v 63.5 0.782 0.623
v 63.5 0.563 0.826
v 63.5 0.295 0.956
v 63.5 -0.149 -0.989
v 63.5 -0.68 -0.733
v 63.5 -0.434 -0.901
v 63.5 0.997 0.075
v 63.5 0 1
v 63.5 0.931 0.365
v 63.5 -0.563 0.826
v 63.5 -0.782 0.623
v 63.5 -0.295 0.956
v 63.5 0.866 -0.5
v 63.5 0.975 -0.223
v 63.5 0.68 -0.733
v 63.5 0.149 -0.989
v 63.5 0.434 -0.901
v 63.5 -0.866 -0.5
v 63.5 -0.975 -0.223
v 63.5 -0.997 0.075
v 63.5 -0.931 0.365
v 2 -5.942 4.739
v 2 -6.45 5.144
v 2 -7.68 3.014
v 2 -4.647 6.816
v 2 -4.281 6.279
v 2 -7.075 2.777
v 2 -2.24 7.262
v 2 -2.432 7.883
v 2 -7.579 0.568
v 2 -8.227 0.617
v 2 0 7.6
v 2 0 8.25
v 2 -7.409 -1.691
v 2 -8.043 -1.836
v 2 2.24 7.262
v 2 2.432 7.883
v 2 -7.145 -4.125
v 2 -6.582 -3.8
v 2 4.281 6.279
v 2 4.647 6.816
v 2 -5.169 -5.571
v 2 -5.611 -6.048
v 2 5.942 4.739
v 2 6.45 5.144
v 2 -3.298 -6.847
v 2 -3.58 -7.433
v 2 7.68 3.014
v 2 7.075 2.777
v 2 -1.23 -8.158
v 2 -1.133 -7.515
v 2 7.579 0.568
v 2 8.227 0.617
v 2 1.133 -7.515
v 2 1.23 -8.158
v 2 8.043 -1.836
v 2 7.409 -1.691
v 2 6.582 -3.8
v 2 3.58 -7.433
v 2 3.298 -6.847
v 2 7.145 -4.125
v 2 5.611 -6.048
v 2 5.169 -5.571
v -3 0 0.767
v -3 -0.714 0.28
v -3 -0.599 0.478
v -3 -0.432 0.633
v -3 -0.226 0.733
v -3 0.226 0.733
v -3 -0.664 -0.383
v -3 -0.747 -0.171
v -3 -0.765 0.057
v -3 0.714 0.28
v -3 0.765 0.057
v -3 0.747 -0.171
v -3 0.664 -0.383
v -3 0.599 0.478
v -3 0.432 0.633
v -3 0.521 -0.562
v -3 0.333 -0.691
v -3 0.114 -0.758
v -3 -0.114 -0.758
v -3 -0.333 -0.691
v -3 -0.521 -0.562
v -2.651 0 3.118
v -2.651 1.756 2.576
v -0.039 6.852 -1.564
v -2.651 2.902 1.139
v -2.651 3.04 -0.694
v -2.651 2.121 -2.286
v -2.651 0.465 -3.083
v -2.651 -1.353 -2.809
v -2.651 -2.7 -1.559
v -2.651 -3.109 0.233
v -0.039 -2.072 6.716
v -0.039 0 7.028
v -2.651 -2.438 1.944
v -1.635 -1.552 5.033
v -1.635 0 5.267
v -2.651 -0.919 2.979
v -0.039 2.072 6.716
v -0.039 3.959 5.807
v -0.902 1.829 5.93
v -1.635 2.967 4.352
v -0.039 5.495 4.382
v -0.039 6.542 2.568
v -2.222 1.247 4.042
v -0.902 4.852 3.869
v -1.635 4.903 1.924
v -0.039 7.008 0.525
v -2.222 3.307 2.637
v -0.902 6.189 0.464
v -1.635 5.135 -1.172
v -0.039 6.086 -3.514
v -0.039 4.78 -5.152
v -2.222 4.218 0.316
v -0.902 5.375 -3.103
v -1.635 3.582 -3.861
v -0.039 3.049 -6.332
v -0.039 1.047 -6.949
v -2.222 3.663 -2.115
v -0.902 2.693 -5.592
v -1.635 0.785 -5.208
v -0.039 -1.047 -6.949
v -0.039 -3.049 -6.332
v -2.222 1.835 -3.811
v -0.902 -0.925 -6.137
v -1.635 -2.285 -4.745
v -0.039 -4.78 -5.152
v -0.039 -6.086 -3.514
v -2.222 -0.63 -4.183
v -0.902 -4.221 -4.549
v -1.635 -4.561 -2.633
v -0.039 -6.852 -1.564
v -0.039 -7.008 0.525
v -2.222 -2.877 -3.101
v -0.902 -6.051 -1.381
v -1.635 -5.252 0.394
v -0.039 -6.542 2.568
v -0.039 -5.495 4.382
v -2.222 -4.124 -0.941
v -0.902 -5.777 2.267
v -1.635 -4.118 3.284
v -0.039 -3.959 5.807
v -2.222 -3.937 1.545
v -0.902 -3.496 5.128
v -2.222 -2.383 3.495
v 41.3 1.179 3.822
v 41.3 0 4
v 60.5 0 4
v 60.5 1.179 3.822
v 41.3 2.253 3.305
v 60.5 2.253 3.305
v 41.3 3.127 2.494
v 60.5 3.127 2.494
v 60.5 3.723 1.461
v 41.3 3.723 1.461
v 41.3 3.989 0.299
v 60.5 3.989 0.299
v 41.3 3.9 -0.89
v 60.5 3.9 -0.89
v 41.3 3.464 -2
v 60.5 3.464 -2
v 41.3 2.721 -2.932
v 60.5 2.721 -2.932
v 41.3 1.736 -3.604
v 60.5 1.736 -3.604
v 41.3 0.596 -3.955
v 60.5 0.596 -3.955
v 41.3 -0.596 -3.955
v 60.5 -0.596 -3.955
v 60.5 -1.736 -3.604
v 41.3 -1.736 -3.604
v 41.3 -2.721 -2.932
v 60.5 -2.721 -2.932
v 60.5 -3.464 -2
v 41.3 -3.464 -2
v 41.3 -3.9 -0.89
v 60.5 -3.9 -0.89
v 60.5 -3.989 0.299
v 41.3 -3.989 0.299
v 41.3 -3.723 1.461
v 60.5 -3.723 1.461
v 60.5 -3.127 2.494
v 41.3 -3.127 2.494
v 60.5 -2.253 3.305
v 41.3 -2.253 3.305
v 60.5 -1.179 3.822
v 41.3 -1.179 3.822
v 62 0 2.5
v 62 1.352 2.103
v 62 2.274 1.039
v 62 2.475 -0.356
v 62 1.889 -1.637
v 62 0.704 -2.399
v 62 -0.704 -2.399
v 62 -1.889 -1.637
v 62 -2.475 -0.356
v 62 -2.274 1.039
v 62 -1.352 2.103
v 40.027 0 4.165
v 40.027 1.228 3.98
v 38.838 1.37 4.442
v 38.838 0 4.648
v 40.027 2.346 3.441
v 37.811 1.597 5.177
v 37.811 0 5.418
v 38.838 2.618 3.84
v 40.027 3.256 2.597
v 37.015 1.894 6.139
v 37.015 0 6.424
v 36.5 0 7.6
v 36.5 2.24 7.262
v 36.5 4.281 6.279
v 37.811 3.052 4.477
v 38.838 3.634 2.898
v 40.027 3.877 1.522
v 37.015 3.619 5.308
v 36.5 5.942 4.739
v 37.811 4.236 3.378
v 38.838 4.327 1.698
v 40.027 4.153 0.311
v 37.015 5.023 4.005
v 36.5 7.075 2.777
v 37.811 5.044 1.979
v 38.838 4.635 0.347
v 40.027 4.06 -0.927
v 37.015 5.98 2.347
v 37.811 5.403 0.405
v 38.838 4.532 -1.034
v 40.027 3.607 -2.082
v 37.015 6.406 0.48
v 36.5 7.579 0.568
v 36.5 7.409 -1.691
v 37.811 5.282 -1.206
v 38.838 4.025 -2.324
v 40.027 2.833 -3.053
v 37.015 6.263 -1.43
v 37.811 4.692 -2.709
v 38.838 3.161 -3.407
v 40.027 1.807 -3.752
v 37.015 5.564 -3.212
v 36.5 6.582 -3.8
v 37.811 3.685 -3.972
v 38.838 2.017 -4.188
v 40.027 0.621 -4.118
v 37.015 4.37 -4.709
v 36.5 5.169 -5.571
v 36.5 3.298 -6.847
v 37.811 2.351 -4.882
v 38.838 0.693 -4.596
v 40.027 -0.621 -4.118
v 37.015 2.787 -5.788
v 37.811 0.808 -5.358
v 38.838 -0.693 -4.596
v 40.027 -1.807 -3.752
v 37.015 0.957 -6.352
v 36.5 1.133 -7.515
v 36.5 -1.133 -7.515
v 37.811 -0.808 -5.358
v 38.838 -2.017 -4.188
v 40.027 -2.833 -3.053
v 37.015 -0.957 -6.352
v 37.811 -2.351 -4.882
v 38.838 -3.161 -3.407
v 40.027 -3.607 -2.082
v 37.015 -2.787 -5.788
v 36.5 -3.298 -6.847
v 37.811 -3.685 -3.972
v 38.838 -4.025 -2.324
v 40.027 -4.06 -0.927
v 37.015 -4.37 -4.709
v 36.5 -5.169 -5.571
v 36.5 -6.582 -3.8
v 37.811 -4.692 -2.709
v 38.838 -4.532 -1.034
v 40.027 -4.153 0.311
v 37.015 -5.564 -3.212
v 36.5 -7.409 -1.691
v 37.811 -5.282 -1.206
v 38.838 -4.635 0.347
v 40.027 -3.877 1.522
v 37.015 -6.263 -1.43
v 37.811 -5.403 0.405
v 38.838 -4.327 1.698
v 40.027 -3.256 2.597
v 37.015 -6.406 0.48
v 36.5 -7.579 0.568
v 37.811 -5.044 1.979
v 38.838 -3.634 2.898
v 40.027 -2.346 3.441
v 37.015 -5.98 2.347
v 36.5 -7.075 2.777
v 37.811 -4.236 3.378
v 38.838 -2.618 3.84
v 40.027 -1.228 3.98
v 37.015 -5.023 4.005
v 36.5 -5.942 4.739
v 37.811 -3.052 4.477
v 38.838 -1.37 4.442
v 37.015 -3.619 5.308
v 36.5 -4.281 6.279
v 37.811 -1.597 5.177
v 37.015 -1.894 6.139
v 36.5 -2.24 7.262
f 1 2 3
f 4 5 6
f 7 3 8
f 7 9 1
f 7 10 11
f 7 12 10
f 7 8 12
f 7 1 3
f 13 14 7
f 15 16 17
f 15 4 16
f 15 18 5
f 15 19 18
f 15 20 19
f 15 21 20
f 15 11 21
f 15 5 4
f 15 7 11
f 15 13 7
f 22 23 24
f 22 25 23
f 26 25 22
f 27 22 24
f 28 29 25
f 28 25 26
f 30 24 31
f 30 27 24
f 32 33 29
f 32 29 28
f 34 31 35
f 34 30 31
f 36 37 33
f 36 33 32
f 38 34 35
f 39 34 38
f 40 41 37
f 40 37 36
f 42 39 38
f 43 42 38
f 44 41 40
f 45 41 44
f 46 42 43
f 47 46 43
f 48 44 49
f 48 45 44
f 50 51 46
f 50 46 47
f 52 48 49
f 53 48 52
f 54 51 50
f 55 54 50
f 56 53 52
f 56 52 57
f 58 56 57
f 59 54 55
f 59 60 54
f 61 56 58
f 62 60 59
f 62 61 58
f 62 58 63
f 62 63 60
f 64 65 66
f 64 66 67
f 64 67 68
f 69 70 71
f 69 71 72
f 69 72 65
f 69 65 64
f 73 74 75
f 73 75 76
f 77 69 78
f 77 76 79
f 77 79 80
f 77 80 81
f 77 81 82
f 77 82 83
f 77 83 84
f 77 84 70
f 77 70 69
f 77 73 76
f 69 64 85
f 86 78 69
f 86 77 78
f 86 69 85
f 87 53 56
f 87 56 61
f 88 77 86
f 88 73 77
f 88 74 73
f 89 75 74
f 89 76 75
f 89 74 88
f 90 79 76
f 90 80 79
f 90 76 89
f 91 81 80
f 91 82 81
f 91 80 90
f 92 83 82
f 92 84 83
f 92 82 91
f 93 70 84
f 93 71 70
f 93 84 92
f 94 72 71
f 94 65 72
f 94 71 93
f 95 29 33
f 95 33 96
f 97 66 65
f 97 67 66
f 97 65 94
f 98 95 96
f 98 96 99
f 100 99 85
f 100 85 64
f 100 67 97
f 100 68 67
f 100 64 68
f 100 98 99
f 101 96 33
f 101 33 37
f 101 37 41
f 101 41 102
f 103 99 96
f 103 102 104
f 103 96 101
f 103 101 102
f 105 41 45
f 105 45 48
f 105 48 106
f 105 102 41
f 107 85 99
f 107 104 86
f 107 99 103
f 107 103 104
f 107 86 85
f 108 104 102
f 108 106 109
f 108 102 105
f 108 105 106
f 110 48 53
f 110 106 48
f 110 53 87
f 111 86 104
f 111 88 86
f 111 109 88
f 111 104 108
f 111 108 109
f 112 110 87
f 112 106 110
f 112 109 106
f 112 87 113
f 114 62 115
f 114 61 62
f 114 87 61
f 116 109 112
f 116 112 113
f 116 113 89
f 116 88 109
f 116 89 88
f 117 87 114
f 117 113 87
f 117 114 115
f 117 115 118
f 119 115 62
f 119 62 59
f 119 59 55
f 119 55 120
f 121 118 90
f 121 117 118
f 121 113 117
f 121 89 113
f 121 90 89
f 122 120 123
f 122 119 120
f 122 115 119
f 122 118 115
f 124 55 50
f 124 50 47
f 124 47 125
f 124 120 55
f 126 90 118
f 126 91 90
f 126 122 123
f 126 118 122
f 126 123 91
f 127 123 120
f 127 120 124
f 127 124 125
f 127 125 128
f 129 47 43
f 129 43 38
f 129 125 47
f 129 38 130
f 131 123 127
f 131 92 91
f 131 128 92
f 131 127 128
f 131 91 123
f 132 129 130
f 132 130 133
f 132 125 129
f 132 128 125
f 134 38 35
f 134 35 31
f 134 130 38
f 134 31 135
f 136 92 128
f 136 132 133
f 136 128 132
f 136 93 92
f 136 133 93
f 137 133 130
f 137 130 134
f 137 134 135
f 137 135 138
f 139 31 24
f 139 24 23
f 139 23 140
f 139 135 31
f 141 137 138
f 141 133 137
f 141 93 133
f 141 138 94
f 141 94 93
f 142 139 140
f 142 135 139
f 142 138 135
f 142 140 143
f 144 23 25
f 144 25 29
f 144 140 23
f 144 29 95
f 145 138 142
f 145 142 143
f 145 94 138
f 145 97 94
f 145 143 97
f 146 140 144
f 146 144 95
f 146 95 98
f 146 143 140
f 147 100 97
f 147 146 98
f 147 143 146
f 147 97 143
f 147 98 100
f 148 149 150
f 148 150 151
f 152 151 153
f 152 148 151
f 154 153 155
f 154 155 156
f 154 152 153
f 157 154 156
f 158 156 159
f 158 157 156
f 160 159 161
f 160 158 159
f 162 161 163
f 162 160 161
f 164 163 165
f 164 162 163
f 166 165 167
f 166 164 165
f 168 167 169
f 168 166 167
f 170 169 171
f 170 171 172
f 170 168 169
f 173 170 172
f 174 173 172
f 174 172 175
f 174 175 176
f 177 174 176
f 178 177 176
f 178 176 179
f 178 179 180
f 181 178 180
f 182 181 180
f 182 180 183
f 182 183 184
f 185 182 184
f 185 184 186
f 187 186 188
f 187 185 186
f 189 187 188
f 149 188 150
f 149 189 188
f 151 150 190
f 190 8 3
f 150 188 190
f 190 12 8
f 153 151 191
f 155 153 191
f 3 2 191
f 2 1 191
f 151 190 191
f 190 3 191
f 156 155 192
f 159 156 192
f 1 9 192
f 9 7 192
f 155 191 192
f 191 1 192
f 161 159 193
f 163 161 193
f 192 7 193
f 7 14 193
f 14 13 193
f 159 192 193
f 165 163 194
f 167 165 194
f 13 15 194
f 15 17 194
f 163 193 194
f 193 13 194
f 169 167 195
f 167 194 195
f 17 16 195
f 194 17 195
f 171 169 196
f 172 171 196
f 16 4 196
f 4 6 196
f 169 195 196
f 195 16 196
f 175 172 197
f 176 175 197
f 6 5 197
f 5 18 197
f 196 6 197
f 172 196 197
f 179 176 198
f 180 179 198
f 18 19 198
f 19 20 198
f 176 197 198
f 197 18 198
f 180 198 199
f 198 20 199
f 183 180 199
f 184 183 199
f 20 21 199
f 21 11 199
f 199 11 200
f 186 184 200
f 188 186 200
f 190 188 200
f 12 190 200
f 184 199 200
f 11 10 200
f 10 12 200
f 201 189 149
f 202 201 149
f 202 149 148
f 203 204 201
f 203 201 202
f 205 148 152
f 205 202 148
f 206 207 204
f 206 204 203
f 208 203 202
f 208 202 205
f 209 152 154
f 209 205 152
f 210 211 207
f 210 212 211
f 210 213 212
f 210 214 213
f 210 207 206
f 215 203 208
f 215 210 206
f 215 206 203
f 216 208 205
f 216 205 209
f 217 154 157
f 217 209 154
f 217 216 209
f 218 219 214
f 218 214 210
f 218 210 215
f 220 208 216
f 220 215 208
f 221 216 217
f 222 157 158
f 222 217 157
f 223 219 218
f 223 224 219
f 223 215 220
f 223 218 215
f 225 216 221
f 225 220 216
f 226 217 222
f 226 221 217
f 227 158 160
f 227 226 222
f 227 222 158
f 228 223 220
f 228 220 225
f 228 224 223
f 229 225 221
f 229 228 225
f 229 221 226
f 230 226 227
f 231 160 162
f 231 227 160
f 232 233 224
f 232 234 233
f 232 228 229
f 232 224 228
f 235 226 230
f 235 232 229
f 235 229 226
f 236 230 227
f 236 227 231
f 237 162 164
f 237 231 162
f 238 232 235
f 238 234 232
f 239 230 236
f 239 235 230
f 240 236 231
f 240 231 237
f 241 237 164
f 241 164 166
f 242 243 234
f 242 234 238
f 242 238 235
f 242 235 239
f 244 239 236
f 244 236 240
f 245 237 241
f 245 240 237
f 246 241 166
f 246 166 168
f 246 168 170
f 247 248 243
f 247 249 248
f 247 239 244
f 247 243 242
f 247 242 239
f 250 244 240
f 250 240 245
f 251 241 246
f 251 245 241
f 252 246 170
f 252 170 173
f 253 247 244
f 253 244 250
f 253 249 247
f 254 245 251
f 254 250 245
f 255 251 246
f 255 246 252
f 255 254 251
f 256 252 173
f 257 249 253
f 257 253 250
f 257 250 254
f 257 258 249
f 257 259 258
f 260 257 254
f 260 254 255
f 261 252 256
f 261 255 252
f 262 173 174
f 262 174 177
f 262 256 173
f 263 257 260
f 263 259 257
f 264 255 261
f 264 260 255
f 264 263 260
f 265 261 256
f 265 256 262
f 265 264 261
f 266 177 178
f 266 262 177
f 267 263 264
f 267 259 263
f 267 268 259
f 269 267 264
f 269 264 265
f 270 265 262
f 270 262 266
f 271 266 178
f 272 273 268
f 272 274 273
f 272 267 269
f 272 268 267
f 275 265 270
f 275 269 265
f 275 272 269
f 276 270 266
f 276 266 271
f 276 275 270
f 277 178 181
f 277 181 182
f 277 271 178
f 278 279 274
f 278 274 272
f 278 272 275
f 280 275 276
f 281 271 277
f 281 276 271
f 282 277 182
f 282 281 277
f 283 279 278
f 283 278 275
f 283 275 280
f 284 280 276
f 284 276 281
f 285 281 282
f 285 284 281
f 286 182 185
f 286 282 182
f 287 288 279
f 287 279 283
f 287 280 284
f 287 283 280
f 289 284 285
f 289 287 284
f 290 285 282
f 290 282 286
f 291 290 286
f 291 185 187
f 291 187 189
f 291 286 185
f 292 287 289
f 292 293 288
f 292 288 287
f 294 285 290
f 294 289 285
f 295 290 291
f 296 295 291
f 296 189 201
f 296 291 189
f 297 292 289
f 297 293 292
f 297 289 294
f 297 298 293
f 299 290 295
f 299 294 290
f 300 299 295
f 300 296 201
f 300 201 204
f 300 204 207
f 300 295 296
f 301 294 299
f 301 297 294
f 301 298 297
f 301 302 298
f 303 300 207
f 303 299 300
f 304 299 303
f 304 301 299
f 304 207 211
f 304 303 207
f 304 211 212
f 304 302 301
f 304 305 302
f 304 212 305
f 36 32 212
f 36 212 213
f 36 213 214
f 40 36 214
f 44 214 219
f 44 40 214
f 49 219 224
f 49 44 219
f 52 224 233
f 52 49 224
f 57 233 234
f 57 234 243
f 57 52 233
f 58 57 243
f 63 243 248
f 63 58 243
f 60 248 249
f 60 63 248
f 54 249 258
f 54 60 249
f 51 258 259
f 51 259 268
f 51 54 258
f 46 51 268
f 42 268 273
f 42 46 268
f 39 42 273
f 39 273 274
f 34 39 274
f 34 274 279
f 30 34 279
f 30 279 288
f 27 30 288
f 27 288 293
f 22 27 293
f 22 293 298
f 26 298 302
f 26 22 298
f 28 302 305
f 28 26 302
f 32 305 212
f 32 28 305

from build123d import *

# Parameters (mm, degrees)
F3_SIZE = 3


# Not quite as in the source:
# - a fillet or chamfer that OpenCascade refuses, or shapes differently, is made with other operations: its cross-section is extruded or revolved along the edge and cut away or added


with BuildPart() as f1:
    # F0 (on Front) → F1 (revolve)
    with BuildSketch(Plane.XZ):
        Polygon((36.5, 7.6), (2, 7.6), (2, 8.25), (-3, 8.25), (-3, 0), (0, 0), (63.5, 0), (63.5, 4), (36.5, 4), align=None)
    revolve(axis=Axis((31.75, 0, 0), (-1, 0, 0)))

    # F2: fillet of radius 5 on 1 edges, made by hand

    # F2_s1 → F2_t2 (revolve)
    with BuildSketch(Plane.XZ):
        with BuildLine():
            ThreePointArc((41.3, 4), (38.3, 5), (36.5, 7.6))
            Line((36.5, 7.6), (36.5, 4))
            Line((36.5, 4), (41.3, 4))
        make_face()
    revolve(axis=Axis((36.5, 0, 0), (-1, 0, 0)))

    # F3
    f3_edges = [f1.edges().sort_by_distance(p)[0] for p in [
        (63.5, 0, -4),
    ]]
    chamfer(f3_edges, length=F3_SIZE)

    # F4: fillet of radius 8.1 on 1 edges, made by hand

    # F4_s1 → F4_t2 (revolve, cut)
    with BuildSketch(Plane.XZ):
        with BuildLine():
            ThreePointArc((2, 8.25), (-1.6349832962, 5.2666852265), (-3, 0.7666852265))
            Line((-3, 0.7666852265), (-3, 8.25))
            Line((-3, 8.25), (2, 8.25))
        make_face()
    revolve(axis=Axis((-3, 0, 0), (-1, 0, 0)), mode=Mode.SUBTRACT)


solid = f1.part
